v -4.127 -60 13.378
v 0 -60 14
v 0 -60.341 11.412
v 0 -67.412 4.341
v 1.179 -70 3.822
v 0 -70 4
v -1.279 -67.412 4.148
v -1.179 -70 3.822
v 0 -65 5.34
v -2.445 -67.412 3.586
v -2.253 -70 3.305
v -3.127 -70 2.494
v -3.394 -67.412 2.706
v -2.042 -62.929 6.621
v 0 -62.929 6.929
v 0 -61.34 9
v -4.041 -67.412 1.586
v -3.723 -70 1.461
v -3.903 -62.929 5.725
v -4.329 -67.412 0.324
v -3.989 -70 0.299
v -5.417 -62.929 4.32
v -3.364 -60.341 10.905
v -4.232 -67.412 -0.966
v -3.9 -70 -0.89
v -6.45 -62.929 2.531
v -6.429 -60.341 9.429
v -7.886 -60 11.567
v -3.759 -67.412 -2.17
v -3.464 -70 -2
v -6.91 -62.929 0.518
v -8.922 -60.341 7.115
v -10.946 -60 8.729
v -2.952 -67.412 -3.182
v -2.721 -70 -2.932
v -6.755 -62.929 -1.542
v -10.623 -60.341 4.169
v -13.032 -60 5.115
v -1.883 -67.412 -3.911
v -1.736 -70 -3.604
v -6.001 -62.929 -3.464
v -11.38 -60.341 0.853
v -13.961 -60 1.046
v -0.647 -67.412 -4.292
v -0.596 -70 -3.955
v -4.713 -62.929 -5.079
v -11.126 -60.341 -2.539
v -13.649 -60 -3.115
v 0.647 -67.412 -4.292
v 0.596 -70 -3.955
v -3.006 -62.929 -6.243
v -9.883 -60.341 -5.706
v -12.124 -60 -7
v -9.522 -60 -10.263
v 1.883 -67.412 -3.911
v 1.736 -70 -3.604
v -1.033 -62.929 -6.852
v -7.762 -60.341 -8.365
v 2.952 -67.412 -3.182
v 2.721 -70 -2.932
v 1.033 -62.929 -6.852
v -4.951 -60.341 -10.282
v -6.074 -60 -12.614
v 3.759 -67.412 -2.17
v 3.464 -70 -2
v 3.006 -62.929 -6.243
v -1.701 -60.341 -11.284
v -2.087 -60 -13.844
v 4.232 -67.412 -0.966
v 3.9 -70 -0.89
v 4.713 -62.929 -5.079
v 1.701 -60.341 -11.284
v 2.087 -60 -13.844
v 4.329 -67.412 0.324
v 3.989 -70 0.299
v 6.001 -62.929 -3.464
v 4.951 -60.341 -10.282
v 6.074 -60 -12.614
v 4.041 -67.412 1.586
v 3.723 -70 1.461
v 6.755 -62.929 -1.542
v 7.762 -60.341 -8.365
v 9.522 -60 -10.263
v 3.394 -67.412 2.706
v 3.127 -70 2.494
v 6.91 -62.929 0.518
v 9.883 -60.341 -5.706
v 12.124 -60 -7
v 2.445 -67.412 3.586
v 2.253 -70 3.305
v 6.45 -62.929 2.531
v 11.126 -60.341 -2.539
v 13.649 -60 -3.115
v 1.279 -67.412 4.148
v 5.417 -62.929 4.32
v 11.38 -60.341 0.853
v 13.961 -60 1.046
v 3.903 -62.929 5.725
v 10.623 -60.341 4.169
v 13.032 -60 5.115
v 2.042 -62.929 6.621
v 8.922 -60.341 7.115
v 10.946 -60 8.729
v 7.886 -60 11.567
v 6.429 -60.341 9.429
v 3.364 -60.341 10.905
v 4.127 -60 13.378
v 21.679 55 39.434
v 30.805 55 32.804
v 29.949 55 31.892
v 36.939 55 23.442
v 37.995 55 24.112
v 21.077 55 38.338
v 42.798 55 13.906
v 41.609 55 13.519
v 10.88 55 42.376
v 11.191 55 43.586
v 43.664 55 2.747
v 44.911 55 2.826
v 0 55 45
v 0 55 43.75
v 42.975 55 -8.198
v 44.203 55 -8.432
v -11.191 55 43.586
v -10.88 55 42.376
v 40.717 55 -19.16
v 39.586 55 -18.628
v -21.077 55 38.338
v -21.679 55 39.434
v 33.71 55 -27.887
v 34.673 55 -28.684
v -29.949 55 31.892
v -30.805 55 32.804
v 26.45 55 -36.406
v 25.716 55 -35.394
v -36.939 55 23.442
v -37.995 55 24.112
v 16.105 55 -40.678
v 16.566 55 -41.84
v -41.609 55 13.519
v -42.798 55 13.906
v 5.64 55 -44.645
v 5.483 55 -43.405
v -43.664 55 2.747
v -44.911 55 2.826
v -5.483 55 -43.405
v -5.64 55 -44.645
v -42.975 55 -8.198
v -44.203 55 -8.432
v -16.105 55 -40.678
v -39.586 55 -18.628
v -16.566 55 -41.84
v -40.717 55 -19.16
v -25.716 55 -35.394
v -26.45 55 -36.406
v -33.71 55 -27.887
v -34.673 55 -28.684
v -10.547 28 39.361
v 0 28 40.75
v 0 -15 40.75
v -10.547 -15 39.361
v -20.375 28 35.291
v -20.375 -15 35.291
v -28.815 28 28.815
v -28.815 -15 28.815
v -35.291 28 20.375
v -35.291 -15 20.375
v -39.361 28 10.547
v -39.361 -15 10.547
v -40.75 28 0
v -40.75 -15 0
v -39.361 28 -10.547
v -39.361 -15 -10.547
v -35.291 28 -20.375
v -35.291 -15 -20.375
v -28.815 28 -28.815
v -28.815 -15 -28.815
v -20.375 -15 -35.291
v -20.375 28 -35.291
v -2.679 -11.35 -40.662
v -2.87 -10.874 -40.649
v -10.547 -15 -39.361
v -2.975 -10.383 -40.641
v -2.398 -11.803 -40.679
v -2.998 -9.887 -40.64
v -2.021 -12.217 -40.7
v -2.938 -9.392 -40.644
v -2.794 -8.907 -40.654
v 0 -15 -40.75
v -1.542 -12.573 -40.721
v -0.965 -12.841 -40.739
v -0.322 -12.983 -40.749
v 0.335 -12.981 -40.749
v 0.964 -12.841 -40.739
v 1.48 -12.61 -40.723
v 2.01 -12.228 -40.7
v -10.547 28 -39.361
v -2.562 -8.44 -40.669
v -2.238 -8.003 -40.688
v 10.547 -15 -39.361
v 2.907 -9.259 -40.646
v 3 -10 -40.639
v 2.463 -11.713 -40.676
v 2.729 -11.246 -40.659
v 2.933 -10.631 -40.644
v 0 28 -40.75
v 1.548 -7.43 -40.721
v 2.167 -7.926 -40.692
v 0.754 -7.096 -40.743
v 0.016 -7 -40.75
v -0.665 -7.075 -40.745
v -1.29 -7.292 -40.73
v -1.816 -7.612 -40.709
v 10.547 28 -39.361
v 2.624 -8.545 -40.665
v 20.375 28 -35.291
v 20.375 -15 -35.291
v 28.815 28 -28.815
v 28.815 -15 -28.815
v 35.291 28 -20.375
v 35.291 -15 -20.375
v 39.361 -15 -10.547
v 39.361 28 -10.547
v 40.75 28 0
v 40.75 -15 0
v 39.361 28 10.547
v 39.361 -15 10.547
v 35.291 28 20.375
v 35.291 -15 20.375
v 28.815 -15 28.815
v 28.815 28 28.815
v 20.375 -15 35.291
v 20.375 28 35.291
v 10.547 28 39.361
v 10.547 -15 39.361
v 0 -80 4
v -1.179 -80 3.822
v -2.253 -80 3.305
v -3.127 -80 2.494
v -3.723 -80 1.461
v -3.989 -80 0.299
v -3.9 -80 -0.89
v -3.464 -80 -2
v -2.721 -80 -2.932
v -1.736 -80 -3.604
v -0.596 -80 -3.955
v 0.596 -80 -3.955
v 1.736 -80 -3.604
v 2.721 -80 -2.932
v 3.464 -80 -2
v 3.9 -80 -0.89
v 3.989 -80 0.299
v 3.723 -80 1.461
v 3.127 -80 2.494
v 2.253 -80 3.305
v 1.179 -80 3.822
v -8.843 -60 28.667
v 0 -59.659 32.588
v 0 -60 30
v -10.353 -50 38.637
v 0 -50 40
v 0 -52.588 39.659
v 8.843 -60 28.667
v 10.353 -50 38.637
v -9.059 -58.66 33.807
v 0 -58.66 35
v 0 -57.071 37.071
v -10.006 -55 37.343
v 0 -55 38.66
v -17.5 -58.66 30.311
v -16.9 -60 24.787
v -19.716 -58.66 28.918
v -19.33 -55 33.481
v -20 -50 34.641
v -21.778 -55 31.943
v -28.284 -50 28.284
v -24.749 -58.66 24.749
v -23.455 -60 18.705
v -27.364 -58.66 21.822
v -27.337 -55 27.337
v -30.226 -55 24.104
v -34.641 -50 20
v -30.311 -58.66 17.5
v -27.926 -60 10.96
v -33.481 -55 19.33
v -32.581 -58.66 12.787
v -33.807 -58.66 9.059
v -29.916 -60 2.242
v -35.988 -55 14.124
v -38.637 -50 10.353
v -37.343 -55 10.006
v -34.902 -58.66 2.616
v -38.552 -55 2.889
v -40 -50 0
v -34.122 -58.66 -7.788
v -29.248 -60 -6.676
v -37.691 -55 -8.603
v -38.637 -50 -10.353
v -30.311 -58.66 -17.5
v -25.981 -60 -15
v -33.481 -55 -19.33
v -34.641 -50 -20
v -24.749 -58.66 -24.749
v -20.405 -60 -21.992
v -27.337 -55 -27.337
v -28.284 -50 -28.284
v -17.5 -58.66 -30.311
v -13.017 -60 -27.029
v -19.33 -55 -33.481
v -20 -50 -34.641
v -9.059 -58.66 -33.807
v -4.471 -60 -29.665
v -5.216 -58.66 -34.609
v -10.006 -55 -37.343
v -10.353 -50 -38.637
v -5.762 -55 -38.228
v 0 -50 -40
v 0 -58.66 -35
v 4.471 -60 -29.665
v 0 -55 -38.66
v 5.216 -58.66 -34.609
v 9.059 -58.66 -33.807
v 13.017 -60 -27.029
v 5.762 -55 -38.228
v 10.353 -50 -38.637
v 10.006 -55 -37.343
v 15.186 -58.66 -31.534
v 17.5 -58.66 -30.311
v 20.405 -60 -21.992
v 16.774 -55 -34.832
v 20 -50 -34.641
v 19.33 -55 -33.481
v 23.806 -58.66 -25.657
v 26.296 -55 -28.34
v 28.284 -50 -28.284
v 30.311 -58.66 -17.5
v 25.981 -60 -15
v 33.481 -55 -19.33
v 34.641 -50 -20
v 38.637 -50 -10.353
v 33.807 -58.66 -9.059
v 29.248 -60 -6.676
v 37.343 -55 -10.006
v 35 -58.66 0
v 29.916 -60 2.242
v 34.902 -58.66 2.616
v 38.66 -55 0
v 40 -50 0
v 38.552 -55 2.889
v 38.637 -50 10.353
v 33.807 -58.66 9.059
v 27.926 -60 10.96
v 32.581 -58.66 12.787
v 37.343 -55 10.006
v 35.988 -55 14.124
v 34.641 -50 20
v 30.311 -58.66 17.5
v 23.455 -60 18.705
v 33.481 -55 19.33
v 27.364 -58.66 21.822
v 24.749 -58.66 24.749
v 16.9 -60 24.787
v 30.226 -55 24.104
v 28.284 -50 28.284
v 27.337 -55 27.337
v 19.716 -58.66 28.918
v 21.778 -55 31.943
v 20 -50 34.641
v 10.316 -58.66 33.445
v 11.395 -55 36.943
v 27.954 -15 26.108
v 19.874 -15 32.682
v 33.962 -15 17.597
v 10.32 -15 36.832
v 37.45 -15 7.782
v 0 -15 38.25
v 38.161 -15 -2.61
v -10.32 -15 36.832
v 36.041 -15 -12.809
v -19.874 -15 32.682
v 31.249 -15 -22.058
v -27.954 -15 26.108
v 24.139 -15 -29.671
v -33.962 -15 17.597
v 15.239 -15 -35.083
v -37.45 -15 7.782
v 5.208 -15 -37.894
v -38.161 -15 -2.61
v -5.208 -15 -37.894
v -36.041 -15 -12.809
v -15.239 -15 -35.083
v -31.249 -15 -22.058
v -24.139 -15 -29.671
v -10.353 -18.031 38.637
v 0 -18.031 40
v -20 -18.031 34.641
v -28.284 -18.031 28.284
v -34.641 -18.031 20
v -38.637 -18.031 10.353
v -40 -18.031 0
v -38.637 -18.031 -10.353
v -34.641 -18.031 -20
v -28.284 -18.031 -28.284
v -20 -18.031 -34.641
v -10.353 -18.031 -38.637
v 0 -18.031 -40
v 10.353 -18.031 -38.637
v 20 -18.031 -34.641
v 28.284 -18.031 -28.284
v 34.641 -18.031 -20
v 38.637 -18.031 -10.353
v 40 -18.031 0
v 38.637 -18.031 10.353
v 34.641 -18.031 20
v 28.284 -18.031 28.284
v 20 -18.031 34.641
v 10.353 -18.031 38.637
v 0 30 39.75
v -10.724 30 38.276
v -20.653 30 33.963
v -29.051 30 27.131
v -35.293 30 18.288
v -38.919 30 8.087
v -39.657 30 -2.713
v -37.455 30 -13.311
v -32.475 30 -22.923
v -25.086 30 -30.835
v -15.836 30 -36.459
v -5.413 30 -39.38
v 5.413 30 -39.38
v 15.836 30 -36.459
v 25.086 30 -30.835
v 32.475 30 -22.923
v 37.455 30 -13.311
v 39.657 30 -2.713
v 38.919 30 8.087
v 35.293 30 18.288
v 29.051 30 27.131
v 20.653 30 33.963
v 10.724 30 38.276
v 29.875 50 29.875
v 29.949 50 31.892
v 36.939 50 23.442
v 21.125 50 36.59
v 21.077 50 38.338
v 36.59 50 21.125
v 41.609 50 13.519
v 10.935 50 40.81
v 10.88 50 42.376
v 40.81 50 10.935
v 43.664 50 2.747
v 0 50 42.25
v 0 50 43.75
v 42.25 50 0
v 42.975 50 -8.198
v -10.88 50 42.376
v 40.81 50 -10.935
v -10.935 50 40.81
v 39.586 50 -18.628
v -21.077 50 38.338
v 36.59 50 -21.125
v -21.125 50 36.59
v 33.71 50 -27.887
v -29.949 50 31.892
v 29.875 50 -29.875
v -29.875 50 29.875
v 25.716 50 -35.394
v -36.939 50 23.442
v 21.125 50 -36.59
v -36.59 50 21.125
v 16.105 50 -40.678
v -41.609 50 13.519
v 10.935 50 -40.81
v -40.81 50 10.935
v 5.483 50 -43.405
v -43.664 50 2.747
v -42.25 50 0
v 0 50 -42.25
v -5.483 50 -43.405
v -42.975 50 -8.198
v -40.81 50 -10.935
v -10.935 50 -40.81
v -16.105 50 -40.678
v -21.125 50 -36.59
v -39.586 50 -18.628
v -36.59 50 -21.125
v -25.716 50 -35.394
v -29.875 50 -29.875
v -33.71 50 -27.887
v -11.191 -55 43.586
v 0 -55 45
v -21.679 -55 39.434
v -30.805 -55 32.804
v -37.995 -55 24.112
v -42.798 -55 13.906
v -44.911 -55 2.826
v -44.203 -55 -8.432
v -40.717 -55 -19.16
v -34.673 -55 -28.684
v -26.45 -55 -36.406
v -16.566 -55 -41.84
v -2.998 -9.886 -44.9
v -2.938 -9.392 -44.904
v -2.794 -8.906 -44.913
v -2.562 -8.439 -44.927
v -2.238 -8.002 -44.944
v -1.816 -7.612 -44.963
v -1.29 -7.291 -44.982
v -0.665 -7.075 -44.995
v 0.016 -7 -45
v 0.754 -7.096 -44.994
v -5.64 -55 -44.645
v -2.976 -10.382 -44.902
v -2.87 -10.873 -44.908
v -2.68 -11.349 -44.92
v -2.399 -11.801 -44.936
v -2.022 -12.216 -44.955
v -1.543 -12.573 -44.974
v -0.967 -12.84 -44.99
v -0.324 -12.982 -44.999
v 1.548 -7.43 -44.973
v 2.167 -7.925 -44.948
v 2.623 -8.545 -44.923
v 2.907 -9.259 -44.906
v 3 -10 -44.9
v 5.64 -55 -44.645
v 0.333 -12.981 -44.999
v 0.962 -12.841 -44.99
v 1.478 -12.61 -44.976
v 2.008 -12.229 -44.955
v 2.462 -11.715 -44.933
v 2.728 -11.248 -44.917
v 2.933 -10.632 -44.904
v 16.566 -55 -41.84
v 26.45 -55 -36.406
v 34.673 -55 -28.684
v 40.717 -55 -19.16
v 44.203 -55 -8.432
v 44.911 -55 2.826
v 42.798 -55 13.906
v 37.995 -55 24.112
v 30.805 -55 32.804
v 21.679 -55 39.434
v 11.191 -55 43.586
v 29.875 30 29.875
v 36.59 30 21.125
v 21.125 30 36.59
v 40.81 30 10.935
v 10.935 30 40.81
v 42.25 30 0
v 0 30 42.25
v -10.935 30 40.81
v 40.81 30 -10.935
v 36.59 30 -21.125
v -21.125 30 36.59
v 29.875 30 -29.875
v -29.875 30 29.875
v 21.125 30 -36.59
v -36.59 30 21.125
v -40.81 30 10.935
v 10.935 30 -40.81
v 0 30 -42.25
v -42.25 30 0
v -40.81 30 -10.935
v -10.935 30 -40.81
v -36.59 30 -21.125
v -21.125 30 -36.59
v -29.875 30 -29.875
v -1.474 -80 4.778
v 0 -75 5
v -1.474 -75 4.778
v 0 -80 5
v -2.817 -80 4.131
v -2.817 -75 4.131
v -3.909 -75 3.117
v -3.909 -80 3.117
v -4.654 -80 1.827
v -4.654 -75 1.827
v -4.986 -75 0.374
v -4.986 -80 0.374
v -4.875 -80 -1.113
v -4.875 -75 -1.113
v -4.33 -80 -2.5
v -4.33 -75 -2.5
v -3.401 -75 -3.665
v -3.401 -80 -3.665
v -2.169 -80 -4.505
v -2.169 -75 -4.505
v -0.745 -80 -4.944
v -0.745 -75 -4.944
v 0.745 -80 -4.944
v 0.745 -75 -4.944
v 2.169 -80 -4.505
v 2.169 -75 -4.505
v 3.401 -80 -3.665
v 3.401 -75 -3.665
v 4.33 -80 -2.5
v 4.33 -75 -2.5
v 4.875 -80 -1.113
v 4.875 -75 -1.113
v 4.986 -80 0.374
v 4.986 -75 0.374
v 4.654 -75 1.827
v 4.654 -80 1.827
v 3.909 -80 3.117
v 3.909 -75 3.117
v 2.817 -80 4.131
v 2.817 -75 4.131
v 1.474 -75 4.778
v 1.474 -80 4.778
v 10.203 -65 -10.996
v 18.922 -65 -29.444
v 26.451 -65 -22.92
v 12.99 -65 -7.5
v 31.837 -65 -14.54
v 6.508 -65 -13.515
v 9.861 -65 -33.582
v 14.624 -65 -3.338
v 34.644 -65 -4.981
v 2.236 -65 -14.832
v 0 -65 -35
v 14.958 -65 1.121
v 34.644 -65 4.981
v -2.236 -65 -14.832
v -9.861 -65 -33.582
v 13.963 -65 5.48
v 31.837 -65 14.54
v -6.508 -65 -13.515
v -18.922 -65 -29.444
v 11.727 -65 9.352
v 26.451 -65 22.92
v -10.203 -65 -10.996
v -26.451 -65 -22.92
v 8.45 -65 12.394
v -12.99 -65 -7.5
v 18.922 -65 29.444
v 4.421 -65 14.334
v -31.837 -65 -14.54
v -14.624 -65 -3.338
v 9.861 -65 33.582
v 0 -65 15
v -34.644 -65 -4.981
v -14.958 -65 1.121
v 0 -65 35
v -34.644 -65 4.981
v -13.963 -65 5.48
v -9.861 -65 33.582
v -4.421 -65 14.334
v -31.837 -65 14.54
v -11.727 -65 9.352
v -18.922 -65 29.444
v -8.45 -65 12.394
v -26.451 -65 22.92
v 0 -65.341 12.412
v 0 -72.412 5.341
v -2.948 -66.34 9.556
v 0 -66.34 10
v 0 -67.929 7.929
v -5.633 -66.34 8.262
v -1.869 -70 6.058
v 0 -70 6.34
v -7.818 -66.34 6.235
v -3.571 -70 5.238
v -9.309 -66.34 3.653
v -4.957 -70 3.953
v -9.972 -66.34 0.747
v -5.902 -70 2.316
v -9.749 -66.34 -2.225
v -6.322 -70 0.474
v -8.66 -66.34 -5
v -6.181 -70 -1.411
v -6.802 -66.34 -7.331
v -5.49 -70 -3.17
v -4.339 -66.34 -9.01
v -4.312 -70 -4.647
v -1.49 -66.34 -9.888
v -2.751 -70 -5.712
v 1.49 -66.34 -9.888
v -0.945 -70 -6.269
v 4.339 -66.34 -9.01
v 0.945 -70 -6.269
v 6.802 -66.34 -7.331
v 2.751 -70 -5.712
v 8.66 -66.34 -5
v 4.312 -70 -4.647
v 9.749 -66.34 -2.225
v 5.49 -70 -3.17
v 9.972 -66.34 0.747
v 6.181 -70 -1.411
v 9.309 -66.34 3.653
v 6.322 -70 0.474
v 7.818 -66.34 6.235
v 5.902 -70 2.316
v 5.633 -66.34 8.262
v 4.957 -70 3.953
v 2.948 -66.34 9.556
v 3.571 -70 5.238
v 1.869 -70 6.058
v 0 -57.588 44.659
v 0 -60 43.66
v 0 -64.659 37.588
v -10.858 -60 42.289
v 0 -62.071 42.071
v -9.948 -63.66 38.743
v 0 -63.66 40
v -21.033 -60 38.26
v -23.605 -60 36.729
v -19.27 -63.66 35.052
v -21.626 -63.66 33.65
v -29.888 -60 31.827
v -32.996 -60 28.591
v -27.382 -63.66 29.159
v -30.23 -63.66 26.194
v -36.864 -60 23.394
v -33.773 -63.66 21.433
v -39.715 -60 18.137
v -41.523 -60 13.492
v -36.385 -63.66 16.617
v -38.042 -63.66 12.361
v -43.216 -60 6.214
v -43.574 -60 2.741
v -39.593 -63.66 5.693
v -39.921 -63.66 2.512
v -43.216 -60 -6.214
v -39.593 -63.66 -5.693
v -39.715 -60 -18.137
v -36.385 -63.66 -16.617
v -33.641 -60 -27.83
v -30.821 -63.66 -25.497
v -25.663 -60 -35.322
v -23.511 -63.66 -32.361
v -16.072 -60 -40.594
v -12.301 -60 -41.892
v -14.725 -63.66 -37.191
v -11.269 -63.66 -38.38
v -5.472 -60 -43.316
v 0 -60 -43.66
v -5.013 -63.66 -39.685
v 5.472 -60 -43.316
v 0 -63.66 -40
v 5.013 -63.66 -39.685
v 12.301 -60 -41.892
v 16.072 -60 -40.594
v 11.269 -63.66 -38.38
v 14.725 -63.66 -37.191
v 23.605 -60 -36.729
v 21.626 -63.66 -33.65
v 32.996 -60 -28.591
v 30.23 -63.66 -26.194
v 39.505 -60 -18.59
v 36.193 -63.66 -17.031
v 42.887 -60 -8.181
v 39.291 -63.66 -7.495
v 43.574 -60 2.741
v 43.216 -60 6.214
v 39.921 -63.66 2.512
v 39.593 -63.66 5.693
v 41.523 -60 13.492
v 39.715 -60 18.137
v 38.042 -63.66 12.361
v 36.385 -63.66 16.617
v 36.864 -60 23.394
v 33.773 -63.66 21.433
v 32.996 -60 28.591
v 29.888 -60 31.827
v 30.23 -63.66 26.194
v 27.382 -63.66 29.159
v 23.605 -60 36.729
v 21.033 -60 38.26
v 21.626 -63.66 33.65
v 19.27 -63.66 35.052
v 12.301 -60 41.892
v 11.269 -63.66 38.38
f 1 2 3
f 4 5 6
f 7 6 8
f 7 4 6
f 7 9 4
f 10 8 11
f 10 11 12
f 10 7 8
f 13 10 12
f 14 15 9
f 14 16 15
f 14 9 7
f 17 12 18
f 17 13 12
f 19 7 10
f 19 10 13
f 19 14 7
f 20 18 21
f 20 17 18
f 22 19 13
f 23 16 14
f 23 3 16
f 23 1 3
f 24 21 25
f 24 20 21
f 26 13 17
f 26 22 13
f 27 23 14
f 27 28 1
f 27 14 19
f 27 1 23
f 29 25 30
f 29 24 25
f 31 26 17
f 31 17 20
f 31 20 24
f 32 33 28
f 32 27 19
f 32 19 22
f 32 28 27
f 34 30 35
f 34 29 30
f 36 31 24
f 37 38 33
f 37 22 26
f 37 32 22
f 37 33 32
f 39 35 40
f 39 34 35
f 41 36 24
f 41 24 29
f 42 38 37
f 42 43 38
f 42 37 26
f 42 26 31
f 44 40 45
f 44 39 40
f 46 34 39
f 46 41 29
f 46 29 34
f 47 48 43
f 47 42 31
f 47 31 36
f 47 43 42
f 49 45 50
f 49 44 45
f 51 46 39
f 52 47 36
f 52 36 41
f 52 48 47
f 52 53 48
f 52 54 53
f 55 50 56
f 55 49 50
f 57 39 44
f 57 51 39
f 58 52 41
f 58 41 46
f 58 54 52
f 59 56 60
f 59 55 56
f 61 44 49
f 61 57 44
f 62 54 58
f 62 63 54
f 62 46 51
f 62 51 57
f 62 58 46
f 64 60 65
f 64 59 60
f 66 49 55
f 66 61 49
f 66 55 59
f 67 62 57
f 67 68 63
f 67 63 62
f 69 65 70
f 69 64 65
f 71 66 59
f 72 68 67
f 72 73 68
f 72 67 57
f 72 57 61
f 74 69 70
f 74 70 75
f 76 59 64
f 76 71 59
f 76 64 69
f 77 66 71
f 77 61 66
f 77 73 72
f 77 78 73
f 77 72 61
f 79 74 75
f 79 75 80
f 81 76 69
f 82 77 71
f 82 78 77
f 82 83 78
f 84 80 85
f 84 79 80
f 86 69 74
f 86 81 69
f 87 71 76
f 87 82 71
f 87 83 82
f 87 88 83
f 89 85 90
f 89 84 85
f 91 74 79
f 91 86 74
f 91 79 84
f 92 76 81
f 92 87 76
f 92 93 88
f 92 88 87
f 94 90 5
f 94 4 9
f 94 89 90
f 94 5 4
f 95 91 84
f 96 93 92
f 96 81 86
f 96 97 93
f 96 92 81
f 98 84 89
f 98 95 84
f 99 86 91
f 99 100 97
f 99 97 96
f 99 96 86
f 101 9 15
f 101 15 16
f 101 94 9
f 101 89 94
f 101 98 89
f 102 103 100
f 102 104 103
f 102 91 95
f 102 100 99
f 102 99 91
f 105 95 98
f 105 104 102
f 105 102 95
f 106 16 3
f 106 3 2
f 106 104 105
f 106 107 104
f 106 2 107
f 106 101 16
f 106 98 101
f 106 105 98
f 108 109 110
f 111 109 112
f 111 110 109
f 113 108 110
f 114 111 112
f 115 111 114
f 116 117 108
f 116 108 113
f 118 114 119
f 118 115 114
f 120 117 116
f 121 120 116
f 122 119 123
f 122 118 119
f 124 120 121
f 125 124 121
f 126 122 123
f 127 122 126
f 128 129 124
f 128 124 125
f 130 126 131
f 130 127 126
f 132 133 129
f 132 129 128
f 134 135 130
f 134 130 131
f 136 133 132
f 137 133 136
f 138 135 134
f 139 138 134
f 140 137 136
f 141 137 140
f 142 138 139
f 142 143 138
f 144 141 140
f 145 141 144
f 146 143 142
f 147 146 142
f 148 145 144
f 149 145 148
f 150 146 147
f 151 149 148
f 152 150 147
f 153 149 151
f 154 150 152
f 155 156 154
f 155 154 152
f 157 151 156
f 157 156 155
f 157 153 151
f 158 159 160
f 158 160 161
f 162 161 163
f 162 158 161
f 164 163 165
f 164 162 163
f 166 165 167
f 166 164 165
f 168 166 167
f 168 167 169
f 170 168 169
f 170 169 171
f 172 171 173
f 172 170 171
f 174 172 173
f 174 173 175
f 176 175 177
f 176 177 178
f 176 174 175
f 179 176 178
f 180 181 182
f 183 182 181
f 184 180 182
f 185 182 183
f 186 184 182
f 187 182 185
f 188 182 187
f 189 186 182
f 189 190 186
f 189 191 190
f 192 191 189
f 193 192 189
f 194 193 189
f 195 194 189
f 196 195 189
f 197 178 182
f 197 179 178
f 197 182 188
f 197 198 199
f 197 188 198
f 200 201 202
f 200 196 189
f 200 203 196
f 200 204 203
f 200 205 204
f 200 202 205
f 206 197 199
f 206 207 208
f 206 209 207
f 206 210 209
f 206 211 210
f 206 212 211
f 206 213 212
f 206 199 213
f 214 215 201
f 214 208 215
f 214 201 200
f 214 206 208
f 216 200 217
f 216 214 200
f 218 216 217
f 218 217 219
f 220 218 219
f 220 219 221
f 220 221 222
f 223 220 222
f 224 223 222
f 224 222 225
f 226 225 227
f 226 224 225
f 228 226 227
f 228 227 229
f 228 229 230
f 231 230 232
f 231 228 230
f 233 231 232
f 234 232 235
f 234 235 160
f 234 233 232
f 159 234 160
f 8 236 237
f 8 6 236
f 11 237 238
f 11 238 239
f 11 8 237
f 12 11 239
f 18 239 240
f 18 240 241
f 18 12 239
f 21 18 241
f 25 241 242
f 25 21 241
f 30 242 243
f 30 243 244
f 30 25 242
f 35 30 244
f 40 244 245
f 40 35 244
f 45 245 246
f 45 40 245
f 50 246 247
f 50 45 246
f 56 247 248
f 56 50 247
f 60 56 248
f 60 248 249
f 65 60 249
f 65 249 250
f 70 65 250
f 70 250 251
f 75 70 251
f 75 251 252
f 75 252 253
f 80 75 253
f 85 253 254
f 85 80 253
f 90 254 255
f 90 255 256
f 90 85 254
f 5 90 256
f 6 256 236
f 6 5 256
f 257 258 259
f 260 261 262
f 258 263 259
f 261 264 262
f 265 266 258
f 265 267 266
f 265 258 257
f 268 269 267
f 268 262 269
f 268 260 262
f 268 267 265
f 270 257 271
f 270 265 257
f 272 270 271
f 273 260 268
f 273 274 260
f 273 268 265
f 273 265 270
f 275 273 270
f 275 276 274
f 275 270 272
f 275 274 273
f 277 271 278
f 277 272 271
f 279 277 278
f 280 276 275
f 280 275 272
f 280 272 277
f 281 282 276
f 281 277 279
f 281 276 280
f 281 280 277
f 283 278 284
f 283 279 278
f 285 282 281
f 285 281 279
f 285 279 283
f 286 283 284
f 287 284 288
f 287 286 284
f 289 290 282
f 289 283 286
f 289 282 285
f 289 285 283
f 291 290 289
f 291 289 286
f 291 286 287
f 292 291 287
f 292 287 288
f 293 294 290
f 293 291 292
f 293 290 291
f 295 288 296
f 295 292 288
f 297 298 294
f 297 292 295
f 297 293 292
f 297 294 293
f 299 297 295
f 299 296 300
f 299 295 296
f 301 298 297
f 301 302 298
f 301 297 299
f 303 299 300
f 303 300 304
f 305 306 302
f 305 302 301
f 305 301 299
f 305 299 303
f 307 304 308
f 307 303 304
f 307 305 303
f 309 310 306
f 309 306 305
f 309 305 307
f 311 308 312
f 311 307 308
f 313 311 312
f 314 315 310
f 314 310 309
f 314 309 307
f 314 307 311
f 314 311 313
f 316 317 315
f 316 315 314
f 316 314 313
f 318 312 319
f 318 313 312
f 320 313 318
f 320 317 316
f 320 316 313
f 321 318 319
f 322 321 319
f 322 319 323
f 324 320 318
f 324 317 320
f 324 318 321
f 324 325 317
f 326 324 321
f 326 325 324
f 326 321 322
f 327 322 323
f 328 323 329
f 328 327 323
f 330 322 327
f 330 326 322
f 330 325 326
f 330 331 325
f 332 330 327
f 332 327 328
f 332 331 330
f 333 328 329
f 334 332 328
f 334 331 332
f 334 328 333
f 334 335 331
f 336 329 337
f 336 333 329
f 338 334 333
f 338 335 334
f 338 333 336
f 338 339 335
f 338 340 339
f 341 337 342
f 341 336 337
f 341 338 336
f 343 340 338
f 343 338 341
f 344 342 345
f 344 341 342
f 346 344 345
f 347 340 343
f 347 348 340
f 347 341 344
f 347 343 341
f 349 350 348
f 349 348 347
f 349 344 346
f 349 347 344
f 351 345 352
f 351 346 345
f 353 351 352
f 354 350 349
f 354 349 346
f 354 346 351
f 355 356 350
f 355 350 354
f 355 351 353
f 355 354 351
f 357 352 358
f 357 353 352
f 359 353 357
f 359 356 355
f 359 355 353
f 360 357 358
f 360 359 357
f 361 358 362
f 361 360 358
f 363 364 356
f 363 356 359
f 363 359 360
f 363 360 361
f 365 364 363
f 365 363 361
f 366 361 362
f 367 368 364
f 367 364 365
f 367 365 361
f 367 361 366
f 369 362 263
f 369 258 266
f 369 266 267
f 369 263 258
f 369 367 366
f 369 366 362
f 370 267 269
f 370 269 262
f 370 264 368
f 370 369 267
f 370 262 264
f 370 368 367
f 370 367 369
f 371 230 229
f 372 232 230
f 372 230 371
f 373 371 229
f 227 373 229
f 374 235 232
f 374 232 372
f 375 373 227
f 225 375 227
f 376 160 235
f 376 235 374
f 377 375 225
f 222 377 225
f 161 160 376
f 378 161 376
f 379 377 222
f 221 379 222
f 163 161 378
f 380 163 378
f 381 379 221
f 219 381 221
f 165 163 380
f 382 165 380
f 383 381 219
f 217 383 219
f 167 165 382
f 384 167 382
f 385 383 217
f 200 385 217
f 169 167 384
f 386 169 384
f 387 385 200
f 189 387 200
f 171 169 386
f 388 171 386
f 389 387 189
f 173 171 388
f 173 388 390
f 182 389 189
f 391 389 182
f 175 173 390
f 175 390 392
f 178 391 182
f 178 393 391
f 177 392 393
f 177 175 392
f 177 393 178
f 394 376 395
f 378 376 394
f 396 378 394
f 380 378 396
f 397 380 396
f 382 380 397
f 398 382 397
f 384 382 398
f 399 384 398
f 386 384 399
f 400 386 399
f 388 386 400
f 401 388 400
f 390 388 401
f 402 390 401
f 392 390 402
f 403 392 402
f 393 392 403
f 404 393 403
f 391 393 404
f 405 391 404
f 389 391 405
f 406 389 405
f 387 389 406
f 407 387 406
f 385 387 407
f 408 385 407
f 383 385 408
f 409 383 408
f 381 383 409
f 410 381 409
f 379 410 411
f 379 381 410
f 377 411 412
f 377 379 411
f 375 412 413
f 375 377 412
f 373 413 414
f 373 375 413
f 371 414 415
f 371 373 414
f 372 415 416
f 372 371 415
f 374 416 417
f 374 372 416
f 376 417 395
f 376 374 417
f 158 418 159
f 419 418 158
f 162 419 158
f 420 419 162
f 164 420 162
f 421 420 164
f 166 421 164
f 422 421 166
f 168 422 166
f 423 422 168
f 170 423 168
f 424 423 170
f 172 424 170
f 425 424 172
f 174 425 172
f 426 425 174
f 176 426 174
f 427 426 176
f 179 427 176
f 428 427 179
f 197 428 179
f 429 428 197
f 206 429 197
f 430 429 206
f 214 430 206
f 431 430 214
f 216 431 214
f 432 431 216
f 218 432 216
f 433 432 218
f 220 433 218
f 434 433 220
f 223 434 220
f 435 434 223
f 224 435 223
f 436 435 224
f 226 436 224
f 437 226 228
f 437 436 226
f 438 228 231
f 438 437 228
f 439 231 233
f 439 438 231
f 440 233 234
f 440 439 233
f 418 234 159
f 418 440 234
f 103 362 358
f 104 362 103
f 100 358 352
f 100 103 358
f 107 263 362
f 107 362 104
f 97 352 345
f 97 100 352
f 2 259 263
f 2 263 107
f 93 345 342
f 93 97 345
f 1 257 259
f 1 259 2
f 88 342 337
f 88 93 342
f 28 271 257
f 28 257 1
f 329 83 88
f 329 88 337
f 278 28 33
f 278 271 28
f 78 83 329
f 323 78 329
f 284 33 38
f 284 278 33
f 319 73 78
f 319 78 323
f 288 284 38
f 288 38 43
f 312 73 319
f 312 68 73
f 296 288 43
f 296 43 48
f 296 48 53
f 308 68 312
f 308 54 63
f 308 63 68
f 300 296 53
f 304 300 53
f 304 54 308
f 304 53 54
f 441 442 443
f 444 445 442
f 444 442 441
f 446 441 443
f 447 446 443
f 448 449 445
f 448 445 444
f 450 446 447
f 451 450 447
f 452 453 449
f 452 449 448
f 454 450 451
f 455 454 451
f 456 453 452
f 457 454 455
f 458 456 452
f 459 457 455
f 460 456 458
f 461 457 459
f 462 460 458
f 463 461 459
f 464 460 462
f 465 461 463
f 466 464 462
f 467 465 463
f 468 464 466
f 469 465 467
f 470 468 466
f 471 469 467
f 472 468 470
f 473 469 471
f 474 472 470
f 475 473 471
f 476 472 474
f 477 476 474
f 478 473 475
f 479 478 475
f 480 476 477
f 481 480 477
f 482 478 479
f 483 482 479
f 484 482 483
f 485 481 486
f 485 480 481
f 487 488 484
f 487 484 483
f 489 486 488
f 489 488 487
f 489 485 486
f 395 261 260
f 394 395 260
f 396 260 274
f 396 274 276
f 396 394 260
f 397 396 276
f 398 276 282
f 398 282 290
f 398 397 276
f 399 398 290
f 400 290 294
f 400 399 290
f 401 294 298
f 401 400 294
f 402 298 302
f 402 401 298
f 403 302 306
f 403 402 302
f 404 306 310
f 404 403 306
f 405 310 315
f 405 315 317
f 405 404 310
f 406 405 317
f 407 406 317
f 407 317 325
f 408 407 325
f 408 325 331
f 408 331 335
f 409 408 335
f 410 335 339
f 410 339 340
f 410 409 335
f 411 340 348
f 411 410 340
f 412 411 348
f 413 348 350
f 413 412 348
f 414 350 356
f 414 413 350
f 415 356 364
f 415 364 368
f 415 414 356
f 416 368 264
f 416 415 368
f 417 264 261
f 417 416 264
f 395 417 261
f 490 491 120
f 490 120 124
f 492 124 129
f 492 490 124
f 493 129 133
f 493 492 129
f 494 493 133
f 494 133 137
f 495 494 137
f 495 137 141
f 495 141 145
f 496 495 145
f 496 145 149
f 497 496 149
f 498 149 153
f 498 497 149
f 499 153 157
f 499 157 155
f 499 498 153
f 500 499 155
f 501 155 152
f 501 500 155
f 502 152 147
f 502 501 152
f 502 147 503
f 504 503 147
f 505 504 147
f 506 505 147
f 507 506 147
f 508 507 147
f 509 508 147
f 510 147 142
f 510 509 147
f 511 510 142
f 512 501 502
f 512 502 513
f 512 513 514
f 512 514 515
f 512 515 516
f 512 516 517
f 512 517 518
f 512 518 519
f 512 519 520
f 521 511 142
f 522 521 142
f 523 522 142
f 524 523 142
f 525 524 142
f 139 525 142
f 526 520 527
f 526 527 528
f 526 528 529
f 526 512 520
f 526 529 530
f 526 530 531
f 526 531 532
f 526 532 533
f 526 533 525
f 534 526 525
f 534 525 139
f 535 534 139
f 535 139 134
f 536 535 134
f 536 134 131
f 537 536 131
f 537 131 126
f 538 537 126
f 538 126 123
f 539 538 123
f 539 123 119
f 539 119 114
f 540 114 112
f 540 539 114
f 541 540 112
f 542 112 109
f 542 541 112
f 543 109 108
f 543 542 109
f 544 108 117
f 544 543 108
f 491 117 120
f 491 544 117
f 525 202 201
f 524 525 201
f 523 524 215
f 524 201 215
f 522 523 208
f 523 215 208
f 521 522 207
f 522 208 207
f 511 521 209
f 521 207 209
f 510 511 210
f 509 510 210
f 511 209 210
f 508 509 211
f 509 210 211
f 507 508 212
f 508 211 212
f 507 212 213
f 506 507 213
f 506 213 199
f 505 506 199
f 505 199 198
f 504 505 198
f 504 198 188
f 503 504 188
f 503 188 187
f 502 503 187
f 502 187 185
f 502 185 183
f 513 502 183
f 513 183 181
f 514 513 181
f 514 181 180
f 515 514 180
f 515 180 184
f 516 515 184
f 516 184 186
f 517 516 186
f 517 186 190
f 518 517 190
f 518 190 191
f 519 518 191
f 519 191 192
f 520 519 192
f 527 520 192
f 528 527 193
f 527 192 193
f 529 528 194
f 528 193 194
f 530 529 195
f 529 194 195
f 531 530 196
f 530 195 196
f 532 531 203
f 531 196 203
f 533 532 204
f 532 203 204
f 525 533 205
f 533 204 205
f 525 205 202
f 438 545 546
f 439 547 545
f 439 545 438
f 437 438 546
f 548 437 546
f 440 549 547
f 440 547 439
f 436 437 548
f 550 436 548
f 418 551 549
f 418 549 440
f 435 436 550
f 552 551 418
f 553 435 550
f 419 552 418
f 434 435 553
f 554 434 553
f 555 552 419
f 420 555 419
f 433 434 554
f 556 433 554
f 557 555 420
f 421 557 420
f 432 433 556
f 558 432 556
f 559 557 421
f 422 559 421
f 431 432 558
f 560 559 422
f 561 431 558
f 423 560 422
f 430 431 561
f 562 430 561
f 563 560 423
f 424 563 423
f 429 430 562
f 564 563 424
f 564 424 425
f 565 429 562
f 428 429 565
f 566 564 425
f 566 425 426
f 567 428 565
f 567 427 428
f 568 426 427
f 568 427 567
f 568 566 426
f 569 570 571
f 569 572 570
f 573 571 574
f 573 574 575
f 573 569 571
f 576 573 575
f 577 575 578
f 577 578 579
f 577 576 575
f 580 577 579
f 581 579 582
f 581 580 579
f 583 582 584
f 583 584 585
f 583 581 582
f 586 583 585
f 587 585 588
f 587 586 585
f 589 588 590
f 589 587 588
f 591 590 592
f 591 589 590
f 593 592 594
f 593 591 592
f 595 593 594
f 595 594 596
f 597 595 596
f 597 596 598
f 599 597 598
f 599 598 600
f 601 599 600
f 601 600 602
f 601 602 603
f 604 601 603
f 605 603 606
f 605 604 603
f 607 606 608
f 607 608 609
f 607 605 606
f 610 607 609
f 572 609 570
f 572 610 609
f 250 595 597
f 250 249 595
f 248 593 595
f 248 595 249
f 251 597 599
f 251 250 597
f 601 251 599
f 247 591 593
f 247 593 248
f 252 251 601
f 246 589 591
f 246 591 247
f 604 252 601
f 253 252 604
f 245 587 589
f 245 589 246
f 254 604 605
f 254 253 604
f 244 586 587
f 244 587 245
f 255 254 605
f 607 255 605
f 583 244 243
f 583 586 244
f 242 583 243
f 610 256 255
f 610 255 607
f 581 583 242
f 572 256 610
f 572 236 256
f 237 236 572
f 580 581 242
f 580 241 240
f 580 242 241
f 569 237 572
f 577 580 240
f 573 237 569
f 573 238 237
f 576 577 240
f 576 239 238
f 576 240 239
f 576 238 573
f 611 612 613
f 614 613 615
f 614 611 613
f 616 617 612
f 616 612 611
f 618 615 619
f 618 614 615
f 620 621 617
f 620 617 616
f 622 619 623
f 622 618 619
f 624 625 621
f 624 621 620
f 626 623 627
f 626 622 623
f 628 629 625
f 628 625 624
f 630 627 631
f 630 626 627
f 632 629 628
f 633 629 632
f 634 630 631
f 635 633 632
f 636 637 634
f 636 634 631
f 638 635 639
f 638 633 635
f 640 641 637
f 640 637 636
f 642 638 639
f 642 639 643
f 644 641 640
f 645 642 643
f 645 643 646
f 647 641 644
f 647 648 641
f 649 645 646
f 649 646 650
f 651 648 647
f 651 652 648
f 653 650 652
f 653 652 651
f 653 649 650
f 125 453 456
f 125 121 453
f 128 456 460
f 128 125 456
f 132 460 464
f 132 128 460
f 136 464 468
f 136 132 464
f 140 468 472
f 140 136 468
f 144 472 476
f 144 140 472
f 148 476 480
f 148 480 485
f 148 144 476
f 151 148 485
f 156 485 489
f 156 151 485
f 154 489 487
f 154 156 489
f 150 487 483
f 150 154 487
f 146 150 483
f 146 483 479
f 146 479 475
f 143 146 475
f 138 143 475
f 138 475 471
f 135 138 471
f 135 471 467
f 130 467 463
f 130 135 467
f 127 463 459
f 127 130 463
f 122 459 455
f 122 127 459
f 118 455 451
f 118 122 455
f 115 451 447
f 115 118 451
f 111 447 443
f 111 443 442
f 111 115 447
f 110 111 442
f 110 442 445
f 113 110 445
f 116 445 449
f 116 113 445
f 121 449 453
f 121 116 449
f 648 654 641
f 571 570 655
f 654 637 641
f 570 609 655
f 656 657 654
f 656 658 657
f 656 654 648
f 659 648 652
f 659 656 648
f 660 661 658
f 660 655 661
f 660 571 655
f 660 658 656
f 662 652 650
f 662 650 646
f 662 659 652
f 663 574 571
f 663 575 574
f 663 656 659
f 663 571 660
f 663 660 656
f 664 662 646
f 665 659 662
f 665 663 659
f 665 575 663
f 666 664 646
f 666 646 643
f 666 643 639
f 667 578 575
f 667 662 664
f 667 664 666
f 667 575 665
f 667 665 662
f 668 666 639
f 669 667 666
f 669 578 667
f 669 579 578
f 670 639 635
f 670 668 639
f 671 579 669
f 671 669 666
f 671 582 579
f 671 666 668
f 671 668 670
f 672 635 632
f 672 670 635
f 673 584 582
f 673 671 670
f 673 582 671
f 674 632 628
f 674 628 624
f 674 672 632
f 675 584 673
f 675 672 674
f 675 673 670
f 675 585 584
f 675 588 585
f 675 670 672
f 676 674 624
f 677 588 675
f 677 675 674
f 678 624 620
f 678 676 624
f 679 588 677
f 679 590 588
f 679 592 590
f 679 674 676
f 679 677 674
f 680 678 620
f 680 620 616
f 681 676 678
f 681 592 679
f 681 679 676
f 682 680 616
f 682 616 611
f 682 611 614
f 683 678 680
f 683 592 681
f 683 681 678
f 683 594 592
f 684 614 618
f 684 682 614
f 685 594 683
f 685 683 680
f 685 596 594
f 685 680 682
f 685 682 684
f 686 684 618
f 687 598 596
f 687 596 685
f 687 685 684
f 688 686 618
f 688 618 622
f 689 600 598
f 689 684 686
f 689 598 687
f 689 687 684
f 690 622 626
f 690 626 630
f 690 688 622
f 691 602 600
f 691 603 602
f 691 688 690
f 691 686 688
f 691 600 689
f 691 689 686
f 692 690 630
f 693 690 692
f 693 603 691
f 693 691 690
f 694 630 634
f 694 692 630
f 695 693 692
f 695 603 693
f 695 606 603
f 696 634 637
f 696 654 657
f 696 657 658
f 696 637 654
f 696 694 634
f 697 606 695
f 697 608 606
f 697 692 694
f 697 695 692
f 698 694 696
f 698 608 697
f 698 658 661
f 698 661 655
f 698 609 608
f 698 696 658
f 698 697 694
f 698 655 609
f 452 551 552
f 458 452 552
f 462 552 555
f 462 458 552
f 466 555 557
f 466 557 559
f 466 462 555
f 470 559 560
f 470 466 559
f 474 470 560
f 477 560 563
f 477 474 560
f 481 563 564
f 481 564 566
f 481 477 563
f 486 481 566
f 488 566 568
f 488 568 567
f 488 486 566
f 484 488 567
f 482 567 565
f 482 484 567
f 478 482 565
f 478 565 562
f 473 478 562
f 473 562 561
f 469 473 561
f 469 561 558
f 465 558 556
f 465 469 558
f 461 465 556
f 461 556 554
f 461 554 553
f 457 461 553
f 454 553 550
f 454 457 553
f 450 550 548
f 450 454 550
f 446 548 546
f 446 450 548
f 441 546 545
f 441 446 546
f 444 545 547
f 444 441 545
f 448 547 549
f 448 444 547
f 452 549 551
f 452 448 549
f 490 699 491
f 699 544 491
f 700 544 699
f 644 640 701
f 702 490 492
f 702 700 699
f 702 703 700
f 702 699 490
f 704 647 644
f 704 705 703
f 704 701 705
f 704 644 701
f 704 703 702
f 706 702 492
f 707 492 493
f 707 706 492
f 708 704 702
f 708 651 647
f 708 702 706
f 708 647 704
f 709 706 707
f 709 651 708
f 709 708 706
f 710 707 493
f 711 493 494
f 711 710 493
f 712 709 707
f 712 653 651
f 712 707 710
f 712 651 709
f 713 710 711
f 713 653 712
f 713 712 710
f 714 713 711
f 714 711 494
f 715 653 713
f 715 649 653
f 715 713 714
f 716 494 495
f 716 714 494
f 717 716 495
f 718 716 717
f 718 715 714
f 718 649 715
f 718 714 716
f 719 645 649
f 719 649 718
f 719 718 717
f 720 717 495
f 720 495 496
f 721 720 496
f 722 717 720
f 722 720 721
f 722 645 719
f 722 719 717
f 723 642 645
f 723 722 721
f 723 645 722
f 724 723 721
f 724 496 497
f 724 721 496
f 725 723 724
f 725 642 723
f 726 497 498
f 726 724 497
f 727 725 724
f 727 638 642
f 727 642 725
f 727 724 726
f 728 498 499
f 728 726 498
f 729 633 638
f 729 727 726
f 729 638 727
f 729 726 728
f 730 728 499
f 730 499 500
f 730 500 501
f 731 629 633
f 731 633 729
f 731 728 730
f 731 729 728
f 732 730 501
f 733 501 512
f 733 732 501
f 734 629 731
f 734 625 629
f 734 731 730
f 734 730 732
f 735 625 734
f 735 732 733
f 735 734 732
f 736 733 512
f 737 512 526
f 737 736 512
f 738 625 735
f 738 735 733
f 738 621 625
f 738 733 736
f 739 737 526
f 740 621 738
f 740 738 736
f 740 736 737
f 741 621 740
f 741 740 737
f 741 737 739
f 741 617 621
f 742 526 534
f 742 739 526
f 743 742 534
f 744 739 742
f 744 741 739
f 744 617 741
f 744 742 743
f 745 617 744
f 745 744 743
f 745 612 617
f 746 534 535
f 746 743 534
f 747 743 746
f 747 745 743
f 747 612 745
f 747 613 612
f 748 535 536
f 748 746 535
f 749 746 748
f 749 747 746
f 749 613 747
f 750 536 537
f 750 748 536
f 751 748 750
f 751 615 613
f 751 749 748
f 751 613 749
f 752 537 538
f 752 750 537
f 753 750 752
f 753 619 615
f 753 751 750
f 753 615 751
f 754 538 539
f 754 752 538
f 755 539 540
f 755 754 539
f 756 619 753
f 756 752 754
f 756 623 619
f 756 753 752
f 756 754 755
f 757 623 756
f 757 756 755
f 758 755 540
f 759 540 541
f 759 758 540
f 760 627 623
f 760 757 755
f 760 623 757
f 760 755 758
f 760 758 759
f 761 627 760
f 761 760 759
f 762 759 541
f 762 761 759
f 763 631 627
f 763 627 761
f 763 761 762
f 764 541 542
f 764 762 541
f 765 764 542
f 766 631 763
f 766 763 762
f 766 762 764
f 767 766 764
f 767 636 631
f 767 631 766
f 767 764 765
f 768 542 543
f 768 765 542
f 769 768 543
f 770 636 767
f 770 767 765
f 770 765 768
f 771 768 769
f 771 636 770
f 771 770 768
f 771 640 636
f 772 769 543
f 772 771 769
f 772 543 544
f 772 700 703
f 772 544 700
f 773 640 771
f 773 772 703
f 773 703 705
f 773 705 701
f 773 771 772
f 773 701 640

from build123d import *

# Parameters (mm, degrees)
SKETCH2_R          = 3
CUT_EXTRUDE1_DEPTH = 103.225241501


with BuildPart() as part:
    # Sketch1 → Revolve1 (revolve)
    with BuildSketch(Plane(origin=(0, 0, 0), x_dir=(0, 0, -1), z_dir=(1, 0, 0))):
        with BuildLine():
            Line((-43.75, 55), (-45, 55))
            Line((-45, 55), (-45, -55))
            ThreePointArc((-45, -55), (-42.071067812, -62.071067812), (-35, -65))
            Line((-35, -65), (-15, -65))
            ThreePointArc((-15, -65), (-7.928932188, -67.928932188), (-5, -75))
            Line((-5, -75), (-5, -80))
            Line((-5, -80), (-4, -80))
            Line((-4, -80), (-4, -70))
            ThreePointArc((-4, -70), (-6.928932188, -62.928932188), (-14, -60))
            Line((-14, -60), (-30, -60))
            ThreePointArc((-30, -60), (-37.071067812, -57.071067812), (-40, -50))
            Line((-40, -50), (-40, -18.031088913))
            Line((-40, -18.031088913), (-38.25, -15))
            Line((-38.25, -15), (-40.75, -15))
            Line((-40.75, -15), (-40.75, 28))
            Line((-40.75, 28), (-39.75, 30))
            Line((-39.75, 30), (-42.25, 30))
            Line((-42.25, 30), (-42.25, 50))
            Line((-42.25, 50), (-43.75, 50))
            Line((-43.75, 50), (-43.75, 55))
        make_face()
    revolve(axis=Axis((0, 48.80804048, 0), (0, -1, 0)))

    # Sketch2 → Cut-Extrude1 (cut, through all)
    with BuildSketch(Plane.XY):
        with Locations((0, -10)):
            Circle(SKETCH2_R)
    extrude(amount=-CUT_EXTRUDE1_DEPTH, mode=Mode.SUBTRACT)


solid = part.part
